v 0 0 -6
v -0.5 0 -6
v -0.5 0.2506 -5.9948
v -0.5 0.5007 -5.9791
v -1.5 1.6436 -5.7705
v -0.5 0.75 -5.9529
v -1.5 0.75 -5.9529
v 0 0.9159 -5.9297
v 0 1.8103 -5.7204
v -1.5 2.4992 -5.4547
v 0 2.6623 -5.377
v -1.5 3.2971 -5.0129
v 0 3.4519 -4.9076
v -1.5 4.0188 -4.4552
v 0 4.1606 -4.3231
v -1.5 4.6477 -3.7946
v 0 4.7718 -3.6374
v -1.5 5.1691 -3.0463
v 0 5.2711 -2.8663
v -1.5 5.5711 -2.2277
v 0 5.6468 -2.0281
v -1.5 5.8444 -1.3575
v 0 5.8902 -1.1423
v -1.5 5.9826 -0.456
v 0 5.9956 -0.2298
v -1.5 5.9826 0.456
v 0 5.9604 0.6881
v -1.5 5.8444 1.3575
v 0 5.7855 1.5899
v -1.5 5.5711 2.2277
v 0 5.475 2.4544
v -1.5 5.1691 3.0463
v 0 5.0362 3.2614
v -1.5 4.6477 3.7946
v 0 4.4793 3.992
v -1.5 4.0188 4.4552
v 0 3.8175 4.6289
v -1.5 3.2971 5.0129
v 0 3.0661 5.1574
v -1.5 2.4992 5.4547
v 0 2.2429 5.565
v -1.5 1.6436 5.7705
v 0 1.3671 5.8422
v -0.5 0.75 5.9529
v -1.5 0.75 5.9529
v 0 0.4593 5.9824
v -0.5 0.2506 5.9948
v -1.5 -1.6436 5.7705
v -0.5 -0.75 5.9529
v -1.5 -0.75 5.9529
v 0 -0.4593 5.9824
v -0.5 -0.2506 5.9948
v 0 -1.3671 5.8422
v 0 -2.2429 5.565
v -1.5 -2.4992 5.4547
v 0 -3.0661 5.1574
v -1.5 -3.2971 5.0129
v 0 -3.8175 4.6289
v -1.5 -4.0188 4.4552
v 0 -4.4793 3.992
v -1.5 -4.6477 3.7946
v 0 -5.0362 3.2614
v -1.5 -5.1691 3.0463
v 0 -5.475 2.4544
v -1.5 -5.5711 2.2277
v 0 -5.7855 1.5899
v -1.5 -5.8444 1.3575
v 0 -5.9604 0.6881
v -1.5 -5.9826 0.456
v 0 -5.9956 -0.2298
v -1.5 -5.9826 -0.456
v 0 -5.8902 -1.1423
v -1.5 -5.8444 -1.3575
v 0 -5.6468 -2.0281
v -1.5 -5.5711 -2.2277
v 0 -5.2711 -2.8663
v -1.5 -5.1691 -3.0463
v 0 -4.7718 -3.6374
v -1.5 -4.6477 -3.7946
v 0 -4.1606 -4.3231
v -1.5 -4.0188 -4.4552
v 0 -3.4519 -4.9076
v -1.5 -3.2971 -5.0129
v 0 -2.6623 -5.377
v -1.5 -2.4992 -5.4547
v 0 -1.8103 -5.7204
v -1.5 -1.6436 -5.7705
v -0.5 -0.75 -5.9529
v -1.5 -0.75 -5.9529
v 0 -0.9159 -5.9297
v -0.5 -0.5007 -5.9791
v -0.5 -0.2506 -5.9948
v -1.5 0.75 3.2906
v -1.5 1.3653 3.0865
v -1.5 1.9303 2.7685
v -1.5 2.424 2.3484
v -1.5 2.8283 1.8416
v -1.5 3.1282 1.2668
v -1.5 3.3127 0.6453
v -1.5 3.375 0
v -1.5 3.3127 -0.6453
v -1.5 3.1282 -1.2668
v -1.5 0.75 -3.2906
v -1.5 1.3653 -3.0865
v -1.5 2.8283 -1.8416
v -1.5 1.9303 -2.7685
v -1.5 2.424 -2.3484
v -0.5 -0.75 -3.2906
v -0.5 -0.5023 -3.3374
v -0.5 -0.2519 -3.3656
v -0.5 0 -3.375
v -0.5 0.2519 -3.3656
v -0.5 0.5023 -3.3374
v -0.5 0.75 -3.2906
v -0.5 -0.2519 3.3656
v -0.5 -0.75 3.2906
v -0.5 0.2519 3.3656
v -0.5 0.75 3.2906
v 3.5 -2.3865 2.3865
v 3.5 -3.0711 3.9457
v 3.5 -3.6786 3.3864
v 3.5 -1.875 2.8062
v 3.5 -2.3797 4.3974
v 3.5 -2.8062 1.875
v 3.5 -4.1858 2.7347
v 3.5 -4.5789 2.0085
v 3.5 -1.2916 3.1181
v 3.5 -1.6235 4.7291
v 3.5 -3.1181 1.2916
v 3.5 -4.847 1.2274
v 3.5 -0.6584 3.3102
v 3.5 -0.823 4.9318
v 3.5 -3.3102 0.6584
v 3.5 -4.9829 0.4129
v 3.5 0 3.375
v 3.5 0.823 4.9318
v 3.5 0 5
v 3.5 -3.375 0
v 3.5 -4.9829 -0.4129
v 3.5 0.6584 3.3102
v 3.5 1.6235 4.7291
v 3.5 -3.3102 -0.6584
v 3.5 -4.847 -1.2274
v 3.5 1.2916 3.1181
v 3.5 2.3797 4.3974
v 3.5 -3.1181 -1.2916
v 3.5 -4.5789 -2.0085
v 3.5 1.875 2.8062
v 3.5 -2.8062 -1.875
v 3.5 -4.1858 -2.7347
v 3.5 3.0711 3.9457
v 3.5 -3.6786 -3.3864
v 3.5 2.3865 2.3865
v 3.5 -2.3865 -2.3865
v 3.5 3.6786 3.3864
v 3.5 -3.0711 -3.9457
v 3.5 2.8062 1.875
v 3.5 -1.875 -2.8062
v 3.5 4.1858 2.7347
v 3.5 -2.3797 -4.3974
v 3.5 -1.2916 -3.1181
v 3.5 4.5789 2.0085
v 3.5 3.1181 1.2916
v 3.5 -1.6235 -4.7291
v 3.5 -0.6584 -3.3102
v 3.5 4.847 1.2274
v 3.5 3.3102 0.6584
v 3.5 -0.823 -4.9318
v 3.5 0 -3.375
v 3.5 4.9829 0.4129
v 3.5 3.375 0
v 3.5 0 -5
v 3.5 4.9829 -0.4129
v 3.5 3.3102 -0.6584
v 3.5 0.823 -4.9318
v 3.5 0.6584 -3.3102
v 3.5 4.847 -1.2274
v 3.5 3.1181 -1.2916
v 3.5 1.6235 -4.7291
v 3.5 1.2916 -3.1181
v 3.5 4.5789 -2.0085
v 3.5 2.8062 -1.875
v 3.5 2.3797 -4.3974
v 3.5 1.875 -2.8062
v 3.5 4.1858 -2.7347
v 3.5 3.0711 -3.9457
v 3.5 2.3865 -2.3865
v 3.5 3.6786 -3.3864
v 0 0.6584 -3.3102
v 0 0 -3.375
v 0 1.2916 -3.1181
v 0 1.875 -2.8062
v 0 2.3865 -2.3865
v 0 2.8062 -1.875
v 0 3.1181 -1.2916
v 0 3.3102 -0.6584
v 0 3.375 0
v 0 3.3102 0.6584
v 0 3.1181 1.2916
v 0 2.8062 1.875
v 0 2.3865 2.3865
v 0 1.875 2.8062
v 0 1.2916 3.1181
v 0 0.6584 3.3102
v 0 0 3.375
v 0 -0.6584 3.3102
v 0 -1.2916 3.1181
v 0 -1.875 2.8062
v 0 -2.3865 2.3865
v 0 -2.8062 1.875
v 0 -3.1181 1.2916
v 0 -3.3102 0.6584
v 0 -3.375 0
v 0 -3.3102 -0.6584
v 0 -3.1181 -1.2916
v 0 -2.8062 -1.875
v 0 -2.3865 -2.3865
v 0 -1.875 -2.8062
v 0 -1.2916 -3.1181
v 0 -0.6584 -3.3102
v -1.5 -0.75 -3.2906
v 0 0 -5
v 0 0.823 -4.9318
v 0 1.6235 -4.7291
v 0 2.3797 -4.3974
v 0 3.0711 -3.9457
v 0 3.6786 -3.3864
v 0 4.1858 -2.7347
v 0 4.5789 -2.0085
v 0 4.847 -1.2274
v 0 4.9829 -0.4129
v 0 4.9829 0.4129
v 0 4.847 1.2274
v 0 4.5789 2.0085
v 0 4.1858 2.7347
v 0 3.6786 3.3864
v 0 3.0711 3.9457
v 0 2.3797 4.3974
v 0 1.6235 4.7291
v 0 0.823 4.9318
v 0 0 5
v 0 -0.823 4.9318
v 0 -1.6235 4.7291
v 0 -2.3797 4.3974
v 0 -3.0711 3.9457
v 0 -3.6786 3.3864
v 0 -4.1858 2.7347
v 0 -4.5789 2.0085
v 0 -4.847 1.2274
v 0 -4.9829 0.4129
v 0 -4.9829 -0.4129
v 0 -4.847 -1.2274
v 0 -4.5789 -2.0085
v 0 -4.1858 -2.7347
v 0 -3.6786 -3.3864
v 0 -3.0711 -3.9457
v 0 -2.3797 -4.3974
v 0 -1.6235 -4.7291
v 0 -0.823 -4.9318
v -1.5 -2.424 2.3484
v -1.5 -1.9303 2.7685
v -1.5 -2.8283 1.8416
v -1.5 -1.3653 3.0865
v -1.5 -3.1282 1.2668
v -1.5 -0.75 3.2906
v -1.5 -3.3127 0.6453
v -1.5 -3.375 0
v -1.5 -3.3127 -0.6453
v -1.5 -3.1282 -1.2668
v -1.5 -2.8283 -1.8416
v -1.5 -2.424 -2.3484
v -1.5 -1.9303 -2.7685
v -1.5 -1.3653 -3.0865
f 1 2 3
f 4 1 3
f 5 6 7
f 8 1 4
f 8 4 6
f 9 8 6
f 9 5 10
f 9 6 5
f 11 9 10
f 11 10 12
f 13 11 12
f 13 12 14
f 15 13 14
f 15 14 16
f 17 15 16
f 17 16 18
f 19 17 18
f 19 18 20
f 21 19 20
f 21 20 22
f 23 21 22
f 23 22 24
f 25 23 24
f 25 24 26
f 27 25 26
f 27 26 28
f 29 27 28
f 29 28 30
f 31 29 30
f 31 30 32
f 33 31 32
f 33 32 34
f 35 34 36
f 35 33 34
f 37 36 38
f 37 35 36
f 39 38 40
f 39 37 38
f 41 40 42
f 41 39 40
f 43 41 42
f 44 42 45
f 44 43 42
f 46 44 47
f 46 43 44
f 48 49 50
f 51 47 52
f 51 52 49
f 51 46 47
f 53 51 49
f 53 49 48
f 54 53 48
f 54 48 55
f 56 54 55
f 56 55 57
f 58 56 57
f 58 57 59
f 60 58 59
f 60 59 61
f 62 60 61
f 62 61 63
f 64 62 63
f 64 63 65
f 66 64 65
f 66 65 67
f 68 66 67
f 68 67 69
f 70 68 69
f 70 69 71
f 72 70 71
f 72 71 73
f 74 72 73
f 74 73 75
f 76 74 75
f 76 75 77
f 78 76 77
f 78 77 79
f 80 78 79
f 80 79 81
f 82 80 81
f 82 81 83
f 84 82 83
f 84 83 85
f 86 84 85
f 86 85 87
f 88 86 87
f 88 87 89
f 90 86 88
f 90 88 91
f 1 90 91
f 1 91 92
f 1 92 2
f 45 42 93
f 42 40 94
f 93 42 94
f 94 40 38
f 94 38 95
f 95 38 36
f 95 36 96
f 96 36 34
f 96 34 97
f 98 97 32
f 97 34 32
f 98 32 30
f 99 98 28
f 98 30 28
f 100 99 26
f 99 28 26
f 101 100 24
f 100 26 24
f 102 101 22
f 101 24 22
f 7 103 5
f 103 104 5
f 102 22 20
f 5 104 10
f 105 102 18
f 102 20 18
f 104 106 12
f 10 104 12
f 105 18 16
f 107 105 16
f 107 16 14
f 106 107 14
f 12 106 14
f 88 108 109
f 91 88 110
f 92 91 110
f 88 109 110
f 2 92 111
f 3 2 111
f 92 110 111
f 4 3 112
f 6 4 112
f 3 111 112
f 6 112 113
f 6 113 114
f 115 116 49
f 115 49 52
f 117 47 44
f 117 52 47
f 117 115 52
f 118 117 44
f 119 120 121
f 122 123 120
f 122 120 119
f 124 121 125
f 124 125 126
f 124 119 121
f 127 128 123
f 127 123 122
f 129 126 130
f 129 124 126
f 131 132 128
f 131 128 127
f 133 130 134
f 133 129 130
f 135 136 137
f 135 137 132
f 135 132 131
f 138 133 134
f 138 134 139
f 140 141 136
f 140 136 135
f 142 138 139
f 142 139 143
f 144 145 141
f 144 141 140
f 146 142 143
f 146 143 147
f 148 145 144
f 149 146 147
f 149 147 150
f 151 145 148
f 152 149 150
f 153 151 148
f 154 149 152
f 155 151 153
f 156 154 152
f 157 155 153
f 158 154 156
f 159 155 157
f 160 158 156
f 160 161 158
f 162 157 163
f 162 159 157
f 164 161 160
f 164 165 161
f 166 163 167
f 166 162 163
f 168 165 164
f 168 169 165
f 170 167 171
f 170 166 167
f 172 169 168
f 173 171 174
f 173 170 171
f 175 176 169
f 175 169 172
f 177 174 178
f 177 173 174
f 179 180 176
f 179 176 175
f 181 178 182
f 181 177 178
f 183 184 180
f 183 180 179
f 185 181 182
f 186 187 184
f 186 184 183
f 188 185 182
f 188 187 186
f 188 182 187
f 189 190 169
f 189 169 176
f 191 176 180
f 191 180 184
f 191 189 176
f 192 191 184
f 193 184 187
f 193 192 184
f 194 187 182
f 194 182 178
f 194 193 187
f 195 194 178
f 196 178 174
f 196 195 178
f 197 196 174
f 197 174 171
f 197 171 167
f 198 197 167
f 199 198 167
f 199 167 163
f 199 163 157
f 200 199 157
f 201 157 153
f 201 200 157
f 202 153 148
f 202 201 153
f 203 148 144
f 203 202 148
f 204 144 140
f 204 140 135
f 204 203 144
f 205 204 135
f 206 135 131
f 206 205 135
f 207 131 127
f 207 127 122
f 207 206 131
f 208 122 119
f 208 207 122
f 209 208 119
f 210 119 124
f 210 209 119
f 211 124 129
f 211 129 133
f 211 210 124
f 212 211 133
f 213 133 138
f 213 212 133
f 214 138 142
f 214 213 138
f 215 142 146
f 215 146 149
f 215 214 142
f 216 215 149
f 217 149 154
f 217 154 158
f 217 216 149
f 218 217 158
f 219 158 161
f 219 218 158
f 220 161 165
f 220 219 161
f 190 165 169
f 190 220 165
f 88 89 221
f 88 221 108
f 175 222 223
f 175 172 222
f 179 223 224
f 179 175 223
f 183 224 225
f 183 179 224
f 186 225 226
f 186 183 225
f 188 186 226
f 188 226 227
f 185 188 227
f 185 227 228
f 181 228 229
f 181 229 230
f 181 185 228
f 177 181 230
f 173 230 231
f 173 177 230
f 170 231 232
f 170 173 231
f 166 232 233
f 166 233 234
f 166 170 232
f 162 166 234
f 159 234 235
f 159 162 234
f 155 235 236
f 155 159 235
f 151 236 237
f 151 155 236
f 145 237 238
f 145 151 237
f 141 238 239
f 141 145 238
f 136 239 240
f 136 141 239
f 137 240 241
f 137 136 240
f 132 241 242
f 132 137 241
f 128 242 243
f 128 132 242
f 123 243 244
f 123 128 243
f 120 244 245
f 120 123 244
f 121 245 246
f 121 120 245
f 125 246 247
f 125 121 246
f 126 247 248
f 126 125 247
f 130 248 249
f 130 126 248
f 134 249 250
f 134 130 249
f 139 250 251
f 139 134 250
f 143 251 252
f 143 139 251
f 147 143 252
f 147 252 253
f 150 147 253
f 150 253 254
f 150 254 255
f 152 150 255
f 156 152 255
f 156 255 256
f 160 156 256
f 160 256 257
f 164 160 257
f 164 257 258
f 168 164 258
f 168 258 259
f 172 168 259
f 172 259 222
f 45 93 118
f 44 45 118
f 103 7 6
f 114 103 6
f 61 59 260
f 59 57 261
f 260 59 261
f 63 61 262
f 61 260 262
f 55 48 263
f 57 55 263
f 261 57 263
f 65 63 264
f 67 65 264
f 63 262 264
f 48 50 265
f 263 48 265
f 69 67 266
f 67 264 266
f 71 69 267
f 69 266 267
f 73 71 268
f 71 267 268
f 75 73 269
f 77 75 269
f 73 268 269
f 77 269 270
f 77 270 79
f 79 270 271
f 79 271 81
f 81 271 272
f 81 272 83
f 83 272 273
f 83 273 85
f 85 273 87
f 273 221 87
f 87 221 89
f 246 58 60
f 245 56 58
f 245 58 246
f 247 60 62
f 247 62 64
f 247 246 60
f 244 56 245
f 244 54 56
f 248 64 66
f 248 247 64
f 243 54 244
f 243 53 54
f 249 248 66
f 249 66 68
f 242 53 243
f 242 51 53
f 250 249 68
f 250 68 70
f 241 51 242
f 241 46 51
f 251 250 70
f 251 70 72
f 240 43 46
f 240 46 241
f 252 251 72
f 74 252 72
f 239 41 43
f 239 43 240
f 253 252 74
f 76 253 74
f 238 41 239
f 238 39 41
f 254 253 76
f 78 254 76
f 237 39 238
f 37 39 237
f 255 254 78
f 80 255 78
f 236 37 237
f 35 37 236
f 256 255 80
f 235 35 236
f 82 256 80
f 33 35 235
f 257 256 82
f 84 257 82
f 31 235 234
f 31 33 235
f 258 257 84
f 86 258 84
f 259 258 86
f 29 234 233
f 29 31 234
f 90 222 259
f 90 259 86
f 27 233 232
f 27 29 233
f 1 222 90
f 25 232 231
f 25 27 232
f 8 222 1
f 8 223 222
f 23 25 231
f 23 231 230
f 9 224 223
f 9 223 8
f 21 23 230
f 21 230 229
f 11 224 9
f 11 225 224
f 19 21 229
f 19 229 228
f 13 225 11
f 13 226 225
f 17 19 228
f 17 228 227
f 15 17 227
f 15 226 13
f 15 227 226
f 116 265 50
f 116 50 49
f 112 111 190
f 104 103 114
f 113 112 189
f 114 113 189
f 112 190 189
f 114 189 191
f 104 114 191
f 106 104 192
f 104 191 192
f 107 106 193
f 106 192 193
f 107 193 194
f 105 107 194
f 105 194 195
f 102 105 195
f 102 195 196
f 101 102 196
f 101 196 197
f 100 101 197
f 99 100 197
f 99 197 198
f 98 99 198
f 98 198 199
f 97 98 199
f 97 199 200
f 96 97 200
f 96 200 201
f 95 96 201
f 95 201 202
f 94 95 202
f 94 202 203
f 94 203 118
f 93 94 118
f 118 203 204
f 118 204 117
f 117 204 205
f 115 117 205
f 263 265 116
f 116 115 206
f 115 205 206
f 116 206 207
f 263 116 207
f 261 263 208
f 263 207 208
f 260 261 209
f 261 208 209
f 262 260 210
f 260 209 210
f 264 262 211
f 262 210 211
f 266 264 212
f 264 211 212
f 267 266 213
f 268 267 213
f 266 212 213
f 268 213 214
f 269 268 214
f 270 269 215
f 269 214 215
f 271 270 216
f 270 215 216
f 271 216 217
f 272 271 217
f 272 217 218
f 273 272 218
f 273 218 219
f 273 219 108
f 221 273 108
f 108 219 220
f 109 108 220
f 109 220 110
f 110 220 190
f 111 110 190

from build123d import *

# Parameters (mm, degrees)
ESQUISSE1_R                  = 5
ESQUISSE1_R_2                = 3.375
EXTRUSION1_DEPTH             = 3.5
EXTRUSION1_DEPTH_BACK        = 1.5
ESQUISSE2_R                  = 6
ESQUISSE2_R_2                = 3.375
EXTRUSION2_DEPTH             = 1.5
ESQUISSE3_W                  = 1
ESQUISSE3_H                  = 1.5
ENL_V_MAT_EXTRU_1_DEPTH      = 7
ENL_V_MAT_EXTRU_1_DEPTH_BACK = 7


with BuildPart() as part:
    # Esquisse1 → Extrusion1 (new body, two sides)
    with BuildSketch(Plane(origin=(0, 0, 0), x_dir=(0, 0, -1), z_dir=(1, 0, 0))) as extrusion1_sk:
        Circle(ESQUISSE1_R)
        Circle(ESQUISSE1_R_2, mode=Mode.SUBTRACT)
    extrude(amount=EXTRUSION1_DEPTH)
    extrude(extrusion1_sk.sketch, amount=-EXTRUSION1_DEPTH_BACK)

    # Esquisse2 → Extrusion2 (add)
    with BuildSketch(Plane(origin=(0, 0, 0), x_dir=(0, 0, -1), z_dir=(1, 0, 0))):
        Circle(ESQUISSE2_R)
        Circle(ESQUISSE2_R_2, mode=Mode.SUBTRACT)
    extrude(amount=-EXTRUSION2_DEPTH)

    # Esquisse3 → Enlèv. mat.-Extru.1 (cut, two sides)
    with BuildSketch(Plane.XY) as enl_v_mat_extru_1_sk:
        with Locations((-1, 0)):
            Rectangle(ESQUISSE3_W, ESQUISSE3_H)
    extrude(amount=ENL_V_MAT_EXTRU_1_DEPTH, mode=Mode.SUBTRACT)
    extrude(enl_v_mat_extru_1_sk.sketch, amount=-ENL_V_MAT_EXTRU_1_DEPTH_BACK, mode=Mode.SUBTRACT)


solid = part.part
